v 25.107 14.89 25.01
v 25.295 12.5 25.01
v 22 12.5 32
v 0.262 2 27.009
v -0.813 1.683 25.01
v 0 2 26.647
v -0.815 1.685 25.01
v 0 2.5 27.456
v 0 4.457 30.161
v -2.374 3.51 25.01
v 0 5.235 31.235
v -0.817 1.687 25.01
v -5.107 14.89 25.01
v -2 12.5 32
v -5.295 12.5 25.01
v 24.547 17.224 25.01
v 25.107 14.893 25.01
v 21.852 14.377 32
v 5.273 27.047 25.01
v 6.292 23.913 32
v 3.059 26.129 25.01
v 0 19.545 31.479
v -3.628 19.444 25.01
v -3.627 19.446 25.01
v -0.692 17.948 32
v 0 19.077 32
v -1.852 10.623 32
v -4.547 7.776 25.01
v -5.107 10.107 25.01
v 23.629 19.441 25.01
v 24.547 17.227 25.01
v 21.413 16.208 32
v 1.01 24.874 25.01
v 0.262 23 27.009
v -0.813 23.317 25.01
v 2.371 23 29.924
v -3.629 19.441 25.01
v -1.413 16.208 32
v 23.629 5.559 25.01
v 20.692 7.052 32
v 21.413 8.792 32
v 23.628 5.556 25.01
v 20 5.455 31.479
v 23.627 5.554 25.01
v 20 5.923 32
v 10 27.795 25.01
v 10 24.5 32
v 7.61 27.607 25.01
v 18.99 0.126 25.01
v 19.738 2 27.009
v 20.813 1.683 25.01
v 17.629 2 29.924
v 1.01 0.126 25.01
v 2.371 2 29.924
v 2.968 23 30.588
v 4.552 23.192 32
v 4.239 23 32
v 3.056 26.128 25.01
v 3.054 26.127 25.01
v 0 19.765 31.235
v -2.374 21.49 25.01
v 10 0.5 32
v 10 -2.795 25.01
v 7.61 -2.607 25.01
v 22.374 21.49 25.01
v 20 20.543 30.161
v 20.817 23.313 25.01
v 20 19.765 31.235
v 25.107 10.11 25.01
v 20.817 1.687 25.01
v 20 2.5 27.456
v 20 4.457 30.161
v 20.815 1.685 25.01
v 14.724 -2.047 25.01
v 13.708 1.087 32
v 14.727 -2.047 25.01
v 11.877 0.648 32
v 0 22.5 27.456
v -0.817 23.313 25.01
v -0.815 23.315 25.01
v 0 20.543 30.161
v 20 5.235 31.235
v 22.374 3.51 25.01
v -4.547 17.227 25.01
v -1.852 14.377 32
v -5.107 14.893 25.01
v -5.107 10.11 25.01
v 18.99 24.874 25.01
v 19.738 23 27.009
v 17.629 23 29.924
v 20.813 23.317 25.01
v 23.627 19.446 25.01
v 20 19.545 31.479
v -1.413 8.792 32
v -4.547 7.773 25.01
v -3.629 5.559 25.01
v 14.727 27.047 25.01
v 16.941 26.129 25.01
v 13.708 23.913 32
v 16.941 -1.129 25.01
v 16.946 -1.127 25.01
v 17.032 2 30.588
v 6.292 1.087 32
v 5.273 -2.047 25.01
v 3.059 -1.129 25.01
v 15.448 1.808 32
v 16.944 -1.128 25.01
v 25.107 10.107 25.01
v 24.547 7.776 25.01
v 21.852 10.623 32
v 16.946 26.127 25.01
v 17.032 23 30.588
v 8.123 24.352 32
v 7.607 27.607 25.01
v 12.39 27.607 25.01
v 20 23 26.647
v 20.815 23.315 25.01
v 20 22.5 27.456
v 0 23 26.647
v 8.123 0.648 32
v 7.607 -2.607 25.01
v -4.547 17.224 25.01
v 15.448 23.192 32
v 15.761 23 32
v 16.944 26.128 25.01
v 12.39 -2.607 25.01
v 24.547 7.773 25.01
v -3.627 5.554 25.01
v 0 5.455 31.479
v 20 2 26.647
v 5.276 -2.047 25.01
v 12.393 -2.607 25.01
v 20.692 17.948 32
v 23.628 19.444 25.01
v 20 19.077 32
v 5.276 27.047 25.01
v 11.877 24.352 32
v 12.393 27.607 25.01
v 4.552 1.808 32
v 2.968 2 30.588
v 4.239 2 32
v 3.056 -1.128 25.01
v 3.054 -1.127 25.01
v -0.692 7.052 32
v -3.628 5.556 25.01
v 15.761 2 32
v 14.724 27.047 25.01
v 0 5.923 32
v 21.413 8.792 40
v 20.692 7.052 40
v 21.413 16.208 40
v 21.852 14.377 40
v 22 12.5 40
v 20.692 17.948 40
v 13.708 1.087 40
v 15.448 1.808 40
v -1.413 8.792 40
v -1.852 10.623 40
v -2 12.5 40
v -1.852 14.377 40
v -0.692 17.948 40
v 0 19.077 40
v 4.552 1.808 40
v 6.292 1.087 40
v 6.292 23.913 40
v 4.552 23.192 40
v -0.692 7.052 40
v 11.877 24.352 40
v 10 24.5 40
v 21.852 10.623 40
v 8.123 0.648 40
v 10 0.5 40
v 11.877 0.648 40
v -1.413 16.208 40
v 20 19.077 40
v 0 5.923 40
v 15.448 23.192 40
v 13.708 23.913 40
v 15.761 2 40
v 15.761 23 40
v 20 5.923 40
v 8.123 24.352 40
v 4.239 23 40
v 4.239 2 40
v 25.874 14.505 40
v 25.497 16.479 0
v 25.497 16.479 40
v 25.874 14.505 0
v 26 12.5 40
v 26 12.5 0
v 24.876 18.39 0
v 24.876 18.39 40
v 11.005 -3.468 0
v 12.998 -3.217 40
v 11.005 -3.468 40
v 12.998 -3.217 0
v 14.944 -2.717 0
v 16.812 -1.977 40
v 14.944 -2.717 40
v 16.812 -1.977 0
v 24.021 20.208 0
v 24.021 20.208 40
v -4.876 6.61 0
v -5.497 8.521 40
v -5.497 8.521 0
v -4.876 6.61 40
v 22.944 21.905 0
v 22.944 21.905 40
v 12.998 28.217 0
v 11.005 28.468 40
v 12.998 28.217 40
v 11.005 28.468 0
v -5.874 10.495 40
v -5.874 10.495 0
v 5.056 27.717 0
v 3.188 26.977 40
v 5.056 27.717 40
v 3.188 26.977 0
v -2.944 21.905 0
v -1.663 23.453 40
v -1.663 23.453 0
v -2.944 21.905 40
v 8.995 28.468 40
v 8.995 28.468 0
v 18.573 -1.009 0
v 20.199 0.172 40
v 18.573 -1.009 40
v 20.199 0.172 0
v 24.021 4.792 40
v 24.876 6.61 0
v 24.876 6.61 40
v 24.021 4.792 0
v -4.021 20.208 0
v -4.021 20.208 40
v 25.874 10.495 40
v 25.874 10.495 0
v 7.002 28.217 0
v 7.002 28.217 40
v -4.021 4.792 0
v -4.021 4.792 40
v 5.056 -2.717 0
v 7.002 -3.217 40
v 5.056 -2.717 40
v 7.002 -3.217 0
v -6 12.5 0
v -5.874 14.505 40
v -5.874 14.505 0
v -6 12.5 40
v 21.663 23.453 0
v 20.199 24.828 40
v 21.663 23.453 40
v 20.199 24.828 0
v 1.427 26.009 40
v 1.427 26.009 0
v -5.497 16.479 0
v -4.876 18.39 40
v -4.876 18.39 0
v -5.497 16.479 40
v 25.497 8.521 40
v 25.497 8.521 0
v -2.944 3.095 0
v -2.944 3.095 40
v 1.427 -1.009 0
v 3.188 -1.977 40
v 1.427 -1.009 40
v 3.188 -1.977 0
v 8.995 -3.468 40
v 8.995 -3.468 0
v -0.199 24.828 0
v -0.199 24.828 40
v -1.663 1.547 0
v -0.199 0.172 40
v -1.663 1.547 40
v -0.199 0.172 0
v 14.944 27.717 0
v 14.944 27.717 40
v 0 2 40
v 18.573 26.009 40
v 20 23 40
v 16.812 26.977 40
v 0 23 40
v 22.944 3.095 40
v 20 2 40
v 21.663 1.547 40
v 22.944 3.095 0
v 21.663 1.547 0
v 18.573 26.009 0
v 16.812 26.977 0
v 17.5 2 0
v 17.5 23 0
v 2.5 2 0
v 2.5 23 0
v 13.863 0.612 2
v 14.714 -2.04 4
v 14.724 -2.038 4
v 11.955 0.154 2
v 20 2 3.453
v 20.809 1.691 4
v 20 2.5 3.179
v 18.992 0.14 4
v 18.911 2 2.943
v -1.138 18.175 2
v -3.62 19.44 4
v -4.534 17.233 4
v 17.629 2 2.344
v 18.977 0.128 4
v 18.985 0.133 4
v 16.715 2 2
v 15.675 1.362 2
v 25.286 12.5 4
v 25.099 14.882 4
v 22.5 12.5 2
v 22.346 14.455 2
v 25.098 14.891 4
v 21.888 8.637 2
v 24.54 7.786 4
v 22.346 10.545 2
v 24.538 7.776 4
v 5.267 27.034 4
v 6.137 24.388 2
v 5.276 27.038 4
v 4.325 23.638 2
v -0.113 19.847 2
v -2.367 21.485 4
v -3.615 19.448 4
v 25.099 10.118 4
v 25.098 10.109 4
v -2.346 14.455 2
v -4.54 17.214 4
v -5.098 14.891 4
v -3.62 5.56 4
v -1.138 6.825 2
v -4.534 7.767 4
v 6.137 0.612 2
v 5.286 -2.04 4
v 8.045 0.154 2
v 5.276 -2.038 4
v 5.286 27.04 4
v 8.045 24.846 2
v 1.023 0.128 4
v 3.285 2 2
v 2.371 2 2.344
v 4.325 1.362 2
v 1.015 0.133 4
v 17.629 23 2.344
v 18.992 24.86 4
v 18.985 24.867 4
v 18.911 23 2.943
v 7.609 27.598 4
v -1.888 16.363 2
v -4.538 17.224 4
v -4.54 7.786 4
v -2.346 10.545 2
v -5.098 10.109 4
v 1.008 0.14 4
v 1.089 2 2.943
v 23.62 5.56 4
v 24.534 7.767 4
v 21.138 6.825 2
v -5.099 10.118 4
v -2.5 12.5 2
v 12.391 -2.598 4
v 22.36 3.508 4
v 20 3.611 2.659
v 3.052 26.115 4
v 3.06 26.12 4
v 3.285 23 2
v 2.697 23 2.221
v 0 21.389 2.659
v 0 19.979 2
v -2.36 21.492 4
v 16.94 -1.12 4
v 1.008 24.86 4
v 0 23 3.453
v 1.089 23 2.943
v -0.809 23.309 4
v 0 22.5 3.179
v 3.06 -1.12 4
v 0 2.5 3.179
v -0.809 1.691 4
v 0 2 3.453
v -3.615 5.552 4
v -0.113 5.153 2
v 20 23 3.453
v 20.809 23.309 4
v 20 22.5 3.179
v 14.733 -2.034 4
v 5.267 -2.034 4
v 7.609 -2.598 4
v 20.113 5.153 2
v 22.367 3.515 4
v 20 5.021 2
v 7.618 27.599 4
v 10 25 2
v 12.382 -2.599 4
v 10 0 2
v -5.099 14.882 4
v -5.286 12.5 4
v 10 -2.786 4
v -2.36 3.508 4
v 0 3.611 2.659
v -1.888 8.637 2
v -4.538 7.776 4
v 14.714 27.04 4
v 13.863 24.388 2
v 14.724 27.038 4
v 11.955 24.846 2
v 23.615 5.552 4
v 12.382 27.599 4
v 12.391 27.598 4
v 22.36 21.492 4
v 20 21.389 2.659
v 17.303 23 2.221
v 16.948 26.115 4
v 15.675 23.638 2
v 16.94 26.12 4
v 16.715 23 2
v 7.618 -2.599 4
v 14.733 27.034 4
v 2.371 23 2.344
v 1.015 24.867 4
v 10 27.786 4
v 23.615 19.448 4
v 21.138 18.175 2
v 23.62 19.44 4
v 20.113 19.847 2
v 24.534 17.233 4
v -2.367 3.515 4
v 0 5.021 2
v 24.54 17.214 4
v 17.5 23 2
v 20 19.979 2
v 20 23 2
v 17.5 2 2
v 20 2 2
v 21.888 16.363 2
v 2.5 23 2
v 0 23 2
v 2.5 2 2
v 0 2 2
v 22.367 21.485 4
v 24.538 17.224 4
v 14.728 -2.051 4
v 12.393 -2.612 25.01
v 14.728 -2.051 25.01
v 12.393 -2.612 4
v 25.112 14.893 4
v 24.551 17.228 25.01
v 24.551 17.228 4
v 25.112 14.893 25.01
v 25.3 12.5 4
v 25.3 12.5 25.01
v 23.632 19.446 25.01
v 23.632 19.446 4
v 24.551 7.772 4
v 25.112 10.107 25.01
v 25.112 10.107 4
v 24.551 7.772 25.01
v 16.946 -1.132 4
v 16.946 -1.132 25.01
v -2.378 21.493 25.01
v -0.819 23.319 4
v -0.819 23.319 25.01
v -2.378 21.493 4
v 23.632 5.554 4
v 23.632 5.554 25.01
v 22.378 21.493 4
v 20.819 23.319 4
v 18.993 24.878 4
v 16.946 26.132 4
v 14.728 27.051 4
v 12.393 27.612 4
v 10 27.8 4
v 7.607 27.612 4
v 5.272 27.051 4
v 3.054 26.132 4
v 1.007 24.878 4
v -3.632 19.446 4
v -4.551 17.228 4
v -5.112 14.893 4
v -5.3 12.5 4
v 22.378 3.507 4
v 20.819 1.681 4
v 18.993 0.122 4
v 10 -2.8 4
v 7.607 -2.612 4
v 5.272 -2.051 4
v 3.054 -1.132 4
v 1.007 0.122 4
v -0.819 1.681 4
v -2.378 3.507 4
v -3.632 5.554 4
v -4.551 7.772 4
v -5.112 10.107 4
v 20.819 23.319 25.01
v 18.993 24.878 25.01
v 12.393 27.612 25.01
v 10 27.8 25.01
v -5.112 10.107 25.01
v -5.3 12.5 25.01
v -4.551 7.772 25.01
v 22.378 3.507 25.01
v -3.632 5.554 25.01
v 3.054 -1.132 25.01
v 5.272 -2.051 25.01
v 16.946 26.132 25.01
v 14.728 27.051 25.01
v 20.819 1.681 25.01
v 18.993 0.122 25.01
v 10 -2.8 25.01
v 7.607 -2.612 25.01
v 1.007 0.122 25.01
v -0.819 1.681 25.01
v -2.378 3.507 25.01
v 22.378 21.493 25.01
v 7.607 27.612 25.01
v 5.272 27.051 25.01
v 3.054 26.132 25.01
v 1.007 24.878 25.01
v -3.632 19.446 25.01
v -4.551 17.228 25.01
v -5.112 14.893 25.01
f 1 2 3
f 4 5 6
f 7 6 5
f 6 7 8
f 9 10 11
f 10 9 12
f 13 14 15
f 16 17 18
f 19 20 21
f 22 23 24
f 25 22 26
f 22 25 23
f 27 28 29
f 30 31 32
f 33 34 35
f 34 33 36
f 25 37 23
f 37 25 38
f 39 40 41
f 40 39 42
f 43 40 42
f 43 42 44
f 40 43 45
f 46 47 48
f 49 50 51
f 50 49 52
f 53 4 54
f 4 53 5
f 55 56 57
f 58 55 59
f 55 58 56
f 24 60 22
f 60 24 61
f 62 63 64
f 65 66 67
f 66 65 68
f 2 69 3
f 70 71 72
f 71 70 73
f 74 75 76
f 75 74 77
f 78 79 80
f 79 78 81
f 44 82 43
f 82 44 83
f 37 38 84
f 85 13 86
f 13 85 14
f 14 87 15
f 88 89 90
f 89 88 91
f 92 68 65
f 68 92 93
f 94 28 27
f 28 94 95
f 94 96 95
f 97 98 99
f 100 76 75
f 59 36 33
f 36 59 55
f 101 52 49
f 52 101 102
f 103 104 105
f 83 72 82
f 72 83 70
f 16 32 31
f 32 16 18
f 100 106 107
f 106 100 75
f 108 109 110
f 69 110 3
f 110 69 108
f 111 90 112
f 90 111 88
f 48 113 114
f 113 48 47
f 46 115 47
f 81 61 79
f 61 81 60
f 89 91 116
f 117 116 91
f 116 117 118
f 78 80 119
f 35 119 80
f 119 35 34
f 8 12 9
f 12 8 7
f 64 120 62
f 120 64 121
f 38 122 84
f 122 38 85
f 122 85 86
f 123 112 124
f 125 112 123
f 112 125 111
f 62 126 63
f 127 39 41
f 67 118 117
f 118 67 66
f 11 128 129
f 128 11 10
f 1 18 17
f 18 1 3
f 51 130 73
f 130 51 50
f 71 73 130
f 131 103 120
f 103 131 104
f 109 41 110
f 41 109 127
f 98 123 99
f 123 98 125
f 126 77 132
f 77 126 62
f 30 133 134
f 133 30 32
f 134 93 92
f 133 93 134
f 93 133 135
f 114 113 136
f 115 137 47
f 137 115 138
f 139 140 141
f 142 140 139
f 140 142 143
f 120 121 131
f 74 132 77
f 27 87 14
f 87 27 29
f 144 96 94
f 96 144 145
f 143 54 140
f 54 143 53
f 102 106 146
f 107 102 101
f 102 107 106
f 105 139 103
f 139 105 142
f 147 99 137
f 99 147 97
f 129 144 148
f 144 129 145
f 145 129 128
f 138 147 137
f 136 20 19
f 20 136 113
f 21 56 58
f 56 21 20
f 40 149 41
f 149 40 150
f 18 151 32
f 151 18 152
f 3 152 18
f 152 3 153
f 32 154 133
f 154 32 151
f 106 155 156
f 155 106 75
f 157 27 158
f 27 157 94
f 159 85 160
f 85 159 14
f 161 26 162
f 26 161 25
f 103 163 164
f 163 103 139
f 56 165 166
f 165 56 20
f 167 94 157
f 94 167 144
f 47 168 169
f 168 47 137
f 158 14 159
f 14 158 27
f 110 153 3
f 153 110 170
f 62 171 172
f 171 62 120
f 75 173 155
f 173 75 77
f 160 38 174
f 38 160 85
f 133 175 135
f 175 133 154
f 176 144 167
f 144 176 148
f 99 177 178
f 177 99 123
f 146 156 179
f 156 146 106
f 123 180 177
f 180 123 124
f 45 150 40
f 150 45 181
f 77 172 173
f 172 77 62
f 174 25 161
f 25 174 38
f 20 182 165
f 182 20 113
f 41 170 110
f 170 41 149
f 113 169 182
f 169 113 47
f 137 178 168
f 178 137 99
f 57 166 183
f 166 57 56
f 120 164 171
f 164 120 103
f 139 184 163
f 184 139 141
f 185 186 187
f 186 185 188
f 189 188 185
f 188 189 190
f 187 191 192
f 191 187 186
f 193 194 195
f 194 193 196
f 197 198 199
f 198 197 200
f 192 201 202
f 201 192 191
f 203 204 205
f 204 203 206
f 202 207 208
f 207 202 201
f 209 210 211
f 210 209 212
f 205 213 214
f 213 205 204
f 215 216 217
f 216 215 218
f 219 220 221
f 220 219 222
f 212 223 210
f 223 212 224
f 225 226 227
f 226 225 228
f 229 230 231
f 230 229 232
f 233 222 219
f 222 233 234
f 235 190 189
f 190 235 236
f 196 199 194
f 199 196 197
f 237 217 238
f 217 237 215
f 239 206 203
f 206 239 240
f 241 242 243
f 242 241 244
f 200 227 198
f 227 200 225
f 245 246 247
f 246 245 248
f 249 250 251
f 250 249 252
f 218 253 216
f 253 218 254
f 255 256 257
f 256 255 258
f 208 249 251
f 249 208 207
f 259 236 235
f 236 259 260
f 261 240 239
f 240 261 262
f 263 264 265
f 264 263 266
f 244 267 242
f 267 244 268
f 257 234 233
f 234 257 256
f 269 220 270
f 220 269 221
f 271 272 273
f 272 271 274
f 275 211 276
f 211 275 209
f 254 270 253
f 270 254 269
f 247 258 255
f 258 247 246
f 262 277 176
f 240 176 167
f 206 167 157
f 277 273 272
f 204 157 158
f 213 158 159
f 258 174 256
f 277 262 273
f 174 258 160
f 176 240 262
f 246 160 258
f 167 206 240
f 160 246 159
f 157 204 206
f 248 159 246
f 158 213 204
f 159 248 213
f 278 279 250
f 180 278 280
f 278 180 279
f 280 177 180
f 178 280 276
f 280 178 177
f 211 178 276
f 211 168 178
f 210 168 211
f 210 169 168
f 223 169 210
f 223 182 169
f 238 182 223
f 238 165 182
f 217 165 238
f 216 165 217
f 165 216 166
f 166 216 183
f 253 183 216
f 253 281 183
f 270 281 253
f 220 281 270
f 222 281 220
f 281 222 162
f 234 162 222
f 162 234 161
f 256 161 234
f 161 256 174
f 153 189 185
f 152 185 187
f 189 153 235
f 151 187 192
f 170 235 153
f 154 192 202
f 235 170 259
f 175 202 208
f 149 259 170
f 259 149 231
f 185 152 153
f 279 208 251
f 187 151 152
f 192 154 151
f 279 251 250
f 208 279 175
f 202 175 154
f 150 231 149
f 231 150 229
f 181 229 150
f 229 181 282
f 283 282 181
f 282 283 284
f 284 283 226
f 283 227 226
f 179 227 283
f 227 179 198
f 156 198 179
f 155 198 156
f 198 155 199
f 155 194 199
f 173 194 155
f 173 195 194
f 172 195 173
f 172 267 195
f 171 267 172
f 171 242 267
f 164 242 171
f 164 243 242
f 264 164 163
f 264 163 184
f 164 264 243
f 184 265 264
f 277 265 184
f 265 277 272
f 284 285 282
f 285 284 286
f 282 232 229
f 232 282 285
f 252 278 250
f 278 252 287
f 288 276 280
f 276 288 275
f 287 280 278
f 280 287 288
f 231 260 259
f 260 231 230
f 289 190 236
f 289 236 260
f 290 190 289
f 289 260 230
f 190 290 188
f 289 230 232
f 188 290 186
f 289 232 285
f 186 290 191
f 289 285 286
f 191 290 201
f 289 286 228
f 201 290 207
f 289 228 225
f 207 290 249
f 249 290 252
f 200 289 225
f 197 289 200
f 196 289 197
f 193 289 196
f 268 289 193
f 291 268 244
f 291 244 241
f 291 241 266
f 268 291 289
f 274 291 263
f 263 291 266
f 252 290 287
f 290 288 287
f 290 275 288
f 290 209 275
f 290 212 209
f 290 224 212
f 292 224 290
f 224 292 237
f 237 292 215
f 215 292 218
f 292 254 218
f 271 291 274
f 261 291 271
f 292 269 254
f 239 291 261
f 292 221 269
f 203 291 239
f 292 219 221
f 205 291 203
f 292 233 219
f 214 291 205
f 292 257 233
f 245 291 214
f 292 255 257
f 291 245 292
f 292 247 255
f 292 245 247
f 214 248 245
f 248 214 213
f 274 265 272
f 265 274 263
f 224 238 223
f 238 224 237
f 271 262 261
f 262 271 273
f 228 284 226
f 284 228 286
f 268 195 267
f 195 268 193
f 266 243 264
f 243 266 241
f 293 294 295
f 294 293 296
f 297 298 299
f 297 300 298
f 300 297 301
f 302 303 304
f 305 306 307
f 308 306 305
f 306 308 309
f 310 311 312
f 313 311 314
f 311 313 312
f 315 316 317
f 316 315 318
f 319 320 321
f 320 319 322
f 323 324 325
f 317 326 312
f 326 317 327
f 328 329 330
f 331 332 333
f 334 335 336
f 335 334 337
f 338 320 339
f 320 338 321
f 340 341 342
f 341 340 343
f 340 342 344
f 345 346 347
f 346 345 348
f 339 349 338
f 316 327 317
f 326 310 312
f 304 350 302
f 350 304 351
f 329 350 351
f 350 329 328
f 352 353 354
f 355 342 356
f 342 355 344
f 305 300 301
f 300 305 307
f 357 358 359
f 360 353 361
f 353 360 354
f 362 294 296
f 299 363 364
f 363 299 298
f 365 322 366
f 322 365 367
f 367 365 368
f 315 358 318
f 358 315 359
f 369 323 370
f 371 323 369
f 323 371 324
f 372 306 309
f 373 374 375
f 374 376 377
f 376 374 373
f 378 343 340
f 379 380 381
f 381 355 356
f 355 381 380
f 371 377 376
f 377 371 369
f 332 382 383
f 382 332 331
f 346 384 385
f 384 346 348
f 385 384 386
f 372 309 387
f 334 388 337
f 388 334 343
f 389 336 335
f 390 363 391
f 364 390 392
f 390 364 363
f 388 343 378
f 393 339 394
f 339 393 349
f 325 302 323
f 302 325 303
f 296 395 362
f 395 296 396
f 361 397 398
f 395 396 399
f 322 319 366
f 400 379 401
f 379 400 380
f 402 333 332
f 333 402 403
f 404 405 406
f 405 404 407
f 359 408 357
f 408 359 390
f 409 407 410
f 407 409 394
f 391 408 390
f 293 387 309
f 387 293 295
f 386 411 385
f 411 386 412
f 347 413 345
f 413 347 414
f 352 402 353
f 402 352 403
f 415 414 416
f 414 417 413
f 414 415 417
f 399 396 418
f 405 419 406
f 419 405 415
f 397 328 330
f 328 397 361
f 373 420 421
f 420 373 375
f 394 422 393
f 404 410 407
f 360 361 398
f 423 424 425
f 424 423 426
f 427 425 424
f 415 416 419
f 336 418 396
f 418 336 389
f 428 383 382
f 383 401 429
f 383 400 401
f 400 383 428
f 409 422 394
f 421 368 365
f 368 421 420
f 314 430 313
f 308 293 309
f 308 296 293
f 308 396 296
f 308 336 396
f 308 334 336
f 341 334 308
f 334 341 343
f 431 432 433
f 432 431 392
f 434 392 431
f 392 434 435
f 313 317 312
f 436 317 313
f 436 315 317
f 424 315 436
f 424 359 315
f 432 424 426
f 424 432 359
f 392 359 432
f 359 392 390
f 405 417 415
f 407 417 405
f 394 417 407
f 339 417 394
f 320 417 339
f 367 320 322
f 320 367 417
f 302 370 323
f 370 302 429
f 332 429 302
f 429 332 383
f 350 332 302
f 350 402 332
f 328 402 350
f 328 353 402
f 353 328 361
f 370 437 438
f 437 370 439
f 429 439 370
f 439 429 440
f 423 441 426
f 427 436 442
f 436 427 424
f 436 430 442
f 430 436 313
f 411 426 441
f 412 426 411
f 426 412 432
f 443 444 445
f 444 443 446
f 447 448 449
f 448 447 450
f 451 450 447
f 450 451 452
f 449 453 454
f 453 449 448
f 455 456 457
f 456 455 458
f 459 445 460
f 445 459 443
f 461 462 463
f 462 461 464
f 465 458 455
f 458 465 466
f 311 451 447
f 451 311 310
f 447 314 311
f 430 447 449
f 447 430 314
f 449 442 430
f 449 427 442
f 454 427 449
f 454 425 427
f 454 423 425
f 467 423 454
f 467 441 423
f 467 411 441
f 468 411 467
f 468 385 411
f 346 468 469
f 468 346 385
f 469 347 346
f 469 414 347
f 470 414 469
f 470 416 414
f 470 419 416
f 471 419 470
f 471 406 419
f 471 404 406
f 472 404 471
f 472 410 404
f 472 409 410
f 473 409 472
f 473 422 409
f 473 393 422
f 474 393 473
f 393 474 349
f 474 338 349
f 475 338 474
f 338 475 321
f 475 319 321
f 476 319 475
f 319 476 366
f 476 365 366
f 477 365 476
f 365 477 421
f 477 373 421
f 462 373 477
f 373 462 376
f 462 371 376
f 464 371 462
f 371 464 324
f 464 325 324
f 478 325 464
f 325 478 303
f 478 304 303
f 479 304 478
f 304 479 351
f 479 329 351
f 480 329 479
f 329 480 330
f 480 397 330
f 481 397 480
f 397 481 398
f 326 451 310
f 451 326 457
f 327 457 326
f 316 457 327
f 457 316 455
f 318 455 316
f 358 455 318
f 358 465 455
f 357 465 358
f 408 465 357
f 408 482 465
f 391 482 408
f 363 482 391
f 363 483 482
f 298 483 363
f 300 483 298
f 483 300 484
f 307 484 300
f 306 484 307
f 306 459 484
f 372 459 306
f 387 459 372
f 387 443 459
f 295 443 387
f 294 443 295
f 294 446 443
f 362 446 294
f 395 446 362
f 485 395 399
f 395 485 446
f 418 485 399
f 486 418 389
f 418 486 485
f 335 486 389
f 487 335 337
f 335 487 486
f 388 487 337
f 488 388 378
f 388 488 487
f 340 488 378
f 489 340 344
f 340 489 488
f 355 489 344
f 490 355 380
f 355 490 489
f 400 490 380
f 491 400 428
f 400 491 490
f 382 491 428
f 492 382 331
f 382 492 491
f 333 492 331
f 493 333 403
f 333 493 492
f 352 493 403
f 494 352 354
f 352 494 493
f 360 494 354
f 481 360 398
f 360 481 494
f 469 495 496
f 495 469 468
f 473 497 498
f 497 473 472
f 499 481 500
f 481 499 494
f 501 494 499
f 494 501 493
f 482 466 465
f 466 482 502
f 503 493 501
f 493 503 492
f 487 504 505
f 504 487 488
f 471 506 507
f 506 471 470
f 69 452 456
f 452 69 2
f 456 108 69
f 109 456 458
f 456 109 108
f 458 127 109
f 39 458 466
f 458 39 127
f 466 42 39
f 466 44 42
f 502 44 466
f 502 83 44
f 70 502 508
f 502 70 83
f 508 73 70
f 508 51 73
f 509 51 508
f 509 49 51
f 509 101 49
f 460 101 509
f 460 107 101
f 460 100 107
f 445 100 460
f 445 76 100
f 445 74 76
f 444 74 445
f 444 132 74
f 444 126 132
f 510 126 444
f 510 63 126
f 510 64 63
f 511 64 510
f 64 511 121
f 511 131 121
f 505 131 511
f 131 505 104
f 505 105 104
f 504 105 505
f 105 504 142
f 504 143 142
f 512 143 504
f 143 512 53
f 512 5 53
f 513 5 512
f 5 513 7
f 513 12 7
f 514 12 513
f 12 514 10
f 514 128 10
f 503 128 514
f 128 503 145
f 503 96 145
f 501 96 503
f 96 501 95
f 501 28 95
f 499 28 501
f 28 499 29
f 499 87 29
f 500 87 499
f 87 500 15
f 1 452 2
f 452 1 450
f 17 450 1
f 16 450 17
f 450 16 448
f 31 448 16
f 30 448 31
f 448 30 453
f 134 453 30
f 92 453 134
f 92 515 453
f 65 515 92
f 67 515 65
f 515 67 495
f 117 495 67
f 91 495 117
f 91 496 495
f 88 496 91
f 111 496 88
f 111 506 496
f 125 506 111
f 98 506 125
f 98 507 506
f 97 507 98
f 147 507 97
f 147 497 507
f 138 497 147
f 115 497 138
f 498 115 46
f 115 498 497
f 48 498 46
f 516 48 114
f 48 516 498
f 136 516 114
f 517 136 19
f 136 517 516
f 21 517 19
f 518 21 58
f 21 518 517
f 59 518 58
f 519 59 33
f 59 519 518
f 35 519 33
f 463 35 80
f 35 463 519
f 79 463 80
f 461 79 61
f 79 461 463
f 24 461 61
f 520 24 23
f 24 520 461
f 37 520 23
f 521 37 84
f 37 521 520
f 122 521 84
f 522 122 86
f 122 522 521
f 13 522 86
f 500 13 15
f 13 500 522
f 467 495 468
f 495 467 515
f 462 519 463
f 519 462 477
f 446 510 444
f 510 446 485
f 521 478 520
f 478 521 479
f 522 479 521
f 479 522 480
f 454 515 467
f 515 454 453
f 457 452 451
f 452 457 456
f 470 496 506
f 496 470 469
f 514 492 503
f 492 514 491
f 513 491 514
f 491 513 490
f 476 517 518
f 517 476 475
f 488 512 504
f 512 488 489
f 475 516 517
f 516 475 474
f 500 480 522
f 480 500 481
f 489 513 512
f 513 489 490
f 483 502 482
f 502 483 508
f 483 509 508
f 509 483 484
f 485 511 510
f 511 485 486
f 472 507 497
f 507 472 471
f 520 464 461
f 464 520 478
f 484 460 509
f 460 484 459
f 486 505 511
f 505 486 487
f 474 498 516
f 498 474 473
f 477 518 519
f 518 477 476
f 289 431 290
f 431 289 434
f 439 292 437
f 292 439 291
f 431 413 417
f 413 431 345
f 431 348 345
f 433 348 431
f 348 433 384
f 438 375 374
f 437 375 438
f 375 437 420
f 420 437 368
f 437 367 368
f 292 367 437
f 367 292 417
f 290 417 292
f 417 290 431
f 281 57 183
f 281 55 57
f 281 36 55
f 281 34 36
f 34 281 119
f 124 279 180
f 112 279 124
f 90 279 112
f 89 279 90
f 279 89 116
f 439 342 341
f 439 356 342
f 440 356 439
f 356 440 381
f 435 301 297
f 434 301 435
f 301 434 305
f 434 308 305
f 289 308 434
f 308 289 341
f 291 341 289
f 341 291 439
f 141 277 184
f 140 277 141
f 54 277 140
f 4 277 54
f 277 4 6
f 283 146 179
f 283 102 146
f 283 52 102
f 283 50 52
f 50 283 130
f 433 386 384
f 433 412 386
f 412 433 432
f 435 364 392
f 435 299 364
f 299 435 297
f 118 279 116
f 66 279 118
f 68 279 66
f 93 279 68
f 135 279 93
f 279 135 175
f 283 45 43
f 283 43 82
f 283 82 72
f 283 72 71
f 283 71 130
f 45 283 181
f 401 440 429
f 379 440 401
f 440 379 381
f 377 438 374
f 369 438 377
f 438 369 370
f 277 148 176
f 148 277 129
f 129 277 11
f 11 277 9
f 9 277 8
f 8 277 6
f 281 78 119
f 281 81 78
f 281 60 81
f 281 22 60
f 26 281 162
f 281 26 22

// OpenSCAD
cylh=40;
od=24;
id=20;
id2=14;
lip=6;
lip2=2;
corr=0;
$fn=80;

difference(){
  union(){
      translate([10,12.5]) cylinder(d=32,h=cylh,$fn=50);
    //translate([-2.5,0,0])
      //cube([25,25,27]);
    *translate([10,12.5,25]) cylinder(d=32,h=cylh-25,$fn=40);
  }
  translate([10,12.5,2]) cylinder(d1=25,d2=30.6,h=2.01,$fn=40);
  translate([10,12.5,4]) cylinder(d=30.6,h=cylh-18.99,$fn=40);
  translate([2.5,2,-.01])
    cube([15,21,cylh+.02]);
  translate([0,2,2])
    cube([20,21,cylh+.01]);
  translate([10,12.5,25]) {
    cylinder(d1=30.6,d2=24,h=7,$fn=40);
    cylinder(d=24,h=cylh-24.99,$fn=40);
  }
}
*difference(){
  union(){
  translate([10,12.5,27]) rotate([0,0,45]) cylinder(d1=35,d2=30,h=5,$fn=4);
  intersection(){
  translate([10,12.5,30]) rotate([0,0,45]) cylinder(d=30,h=7,$fn=4);
  translate([10,12.5,27]) cylinder(d=24,h=10,$fn=30);
  }
  }
  translate([10,12.5,25]) cylinder(d=id-corr-4,h=50,$fn=30);
}
*translate([10,12.5,37]) difference(){
  union(){
    intersection()
    {
      cylinder(d1=id-corr,d2=id-corr+2,h=lip);
      minkowski(){
        sphere(2);
        cylinder(d1=id-corr-4,d2=id-corr-3,h=lip-2);
      }
    }
    //cylinder(d=od+1.2+corr,h=1.2);
    difference(){
      cylinder(d1=od+1.2+corr,d2=od,h=lip2);
      translate([0,0,0.1]) intersection() {
       cylinder(d1=od+corr,d2=od+corr-1.2,h=lip+1);
        minkowski(){
          sphere(1);
          translate([0,0,2]) cylinder(d=od+corr-2,h=lip);
        }
      }
    }
  }
  translate([0,0,-0.1]) cylinder(d=id2,h=lip+1);
  *translate([-7.5,-10,-.01]) cube([15,20,10]);
}
